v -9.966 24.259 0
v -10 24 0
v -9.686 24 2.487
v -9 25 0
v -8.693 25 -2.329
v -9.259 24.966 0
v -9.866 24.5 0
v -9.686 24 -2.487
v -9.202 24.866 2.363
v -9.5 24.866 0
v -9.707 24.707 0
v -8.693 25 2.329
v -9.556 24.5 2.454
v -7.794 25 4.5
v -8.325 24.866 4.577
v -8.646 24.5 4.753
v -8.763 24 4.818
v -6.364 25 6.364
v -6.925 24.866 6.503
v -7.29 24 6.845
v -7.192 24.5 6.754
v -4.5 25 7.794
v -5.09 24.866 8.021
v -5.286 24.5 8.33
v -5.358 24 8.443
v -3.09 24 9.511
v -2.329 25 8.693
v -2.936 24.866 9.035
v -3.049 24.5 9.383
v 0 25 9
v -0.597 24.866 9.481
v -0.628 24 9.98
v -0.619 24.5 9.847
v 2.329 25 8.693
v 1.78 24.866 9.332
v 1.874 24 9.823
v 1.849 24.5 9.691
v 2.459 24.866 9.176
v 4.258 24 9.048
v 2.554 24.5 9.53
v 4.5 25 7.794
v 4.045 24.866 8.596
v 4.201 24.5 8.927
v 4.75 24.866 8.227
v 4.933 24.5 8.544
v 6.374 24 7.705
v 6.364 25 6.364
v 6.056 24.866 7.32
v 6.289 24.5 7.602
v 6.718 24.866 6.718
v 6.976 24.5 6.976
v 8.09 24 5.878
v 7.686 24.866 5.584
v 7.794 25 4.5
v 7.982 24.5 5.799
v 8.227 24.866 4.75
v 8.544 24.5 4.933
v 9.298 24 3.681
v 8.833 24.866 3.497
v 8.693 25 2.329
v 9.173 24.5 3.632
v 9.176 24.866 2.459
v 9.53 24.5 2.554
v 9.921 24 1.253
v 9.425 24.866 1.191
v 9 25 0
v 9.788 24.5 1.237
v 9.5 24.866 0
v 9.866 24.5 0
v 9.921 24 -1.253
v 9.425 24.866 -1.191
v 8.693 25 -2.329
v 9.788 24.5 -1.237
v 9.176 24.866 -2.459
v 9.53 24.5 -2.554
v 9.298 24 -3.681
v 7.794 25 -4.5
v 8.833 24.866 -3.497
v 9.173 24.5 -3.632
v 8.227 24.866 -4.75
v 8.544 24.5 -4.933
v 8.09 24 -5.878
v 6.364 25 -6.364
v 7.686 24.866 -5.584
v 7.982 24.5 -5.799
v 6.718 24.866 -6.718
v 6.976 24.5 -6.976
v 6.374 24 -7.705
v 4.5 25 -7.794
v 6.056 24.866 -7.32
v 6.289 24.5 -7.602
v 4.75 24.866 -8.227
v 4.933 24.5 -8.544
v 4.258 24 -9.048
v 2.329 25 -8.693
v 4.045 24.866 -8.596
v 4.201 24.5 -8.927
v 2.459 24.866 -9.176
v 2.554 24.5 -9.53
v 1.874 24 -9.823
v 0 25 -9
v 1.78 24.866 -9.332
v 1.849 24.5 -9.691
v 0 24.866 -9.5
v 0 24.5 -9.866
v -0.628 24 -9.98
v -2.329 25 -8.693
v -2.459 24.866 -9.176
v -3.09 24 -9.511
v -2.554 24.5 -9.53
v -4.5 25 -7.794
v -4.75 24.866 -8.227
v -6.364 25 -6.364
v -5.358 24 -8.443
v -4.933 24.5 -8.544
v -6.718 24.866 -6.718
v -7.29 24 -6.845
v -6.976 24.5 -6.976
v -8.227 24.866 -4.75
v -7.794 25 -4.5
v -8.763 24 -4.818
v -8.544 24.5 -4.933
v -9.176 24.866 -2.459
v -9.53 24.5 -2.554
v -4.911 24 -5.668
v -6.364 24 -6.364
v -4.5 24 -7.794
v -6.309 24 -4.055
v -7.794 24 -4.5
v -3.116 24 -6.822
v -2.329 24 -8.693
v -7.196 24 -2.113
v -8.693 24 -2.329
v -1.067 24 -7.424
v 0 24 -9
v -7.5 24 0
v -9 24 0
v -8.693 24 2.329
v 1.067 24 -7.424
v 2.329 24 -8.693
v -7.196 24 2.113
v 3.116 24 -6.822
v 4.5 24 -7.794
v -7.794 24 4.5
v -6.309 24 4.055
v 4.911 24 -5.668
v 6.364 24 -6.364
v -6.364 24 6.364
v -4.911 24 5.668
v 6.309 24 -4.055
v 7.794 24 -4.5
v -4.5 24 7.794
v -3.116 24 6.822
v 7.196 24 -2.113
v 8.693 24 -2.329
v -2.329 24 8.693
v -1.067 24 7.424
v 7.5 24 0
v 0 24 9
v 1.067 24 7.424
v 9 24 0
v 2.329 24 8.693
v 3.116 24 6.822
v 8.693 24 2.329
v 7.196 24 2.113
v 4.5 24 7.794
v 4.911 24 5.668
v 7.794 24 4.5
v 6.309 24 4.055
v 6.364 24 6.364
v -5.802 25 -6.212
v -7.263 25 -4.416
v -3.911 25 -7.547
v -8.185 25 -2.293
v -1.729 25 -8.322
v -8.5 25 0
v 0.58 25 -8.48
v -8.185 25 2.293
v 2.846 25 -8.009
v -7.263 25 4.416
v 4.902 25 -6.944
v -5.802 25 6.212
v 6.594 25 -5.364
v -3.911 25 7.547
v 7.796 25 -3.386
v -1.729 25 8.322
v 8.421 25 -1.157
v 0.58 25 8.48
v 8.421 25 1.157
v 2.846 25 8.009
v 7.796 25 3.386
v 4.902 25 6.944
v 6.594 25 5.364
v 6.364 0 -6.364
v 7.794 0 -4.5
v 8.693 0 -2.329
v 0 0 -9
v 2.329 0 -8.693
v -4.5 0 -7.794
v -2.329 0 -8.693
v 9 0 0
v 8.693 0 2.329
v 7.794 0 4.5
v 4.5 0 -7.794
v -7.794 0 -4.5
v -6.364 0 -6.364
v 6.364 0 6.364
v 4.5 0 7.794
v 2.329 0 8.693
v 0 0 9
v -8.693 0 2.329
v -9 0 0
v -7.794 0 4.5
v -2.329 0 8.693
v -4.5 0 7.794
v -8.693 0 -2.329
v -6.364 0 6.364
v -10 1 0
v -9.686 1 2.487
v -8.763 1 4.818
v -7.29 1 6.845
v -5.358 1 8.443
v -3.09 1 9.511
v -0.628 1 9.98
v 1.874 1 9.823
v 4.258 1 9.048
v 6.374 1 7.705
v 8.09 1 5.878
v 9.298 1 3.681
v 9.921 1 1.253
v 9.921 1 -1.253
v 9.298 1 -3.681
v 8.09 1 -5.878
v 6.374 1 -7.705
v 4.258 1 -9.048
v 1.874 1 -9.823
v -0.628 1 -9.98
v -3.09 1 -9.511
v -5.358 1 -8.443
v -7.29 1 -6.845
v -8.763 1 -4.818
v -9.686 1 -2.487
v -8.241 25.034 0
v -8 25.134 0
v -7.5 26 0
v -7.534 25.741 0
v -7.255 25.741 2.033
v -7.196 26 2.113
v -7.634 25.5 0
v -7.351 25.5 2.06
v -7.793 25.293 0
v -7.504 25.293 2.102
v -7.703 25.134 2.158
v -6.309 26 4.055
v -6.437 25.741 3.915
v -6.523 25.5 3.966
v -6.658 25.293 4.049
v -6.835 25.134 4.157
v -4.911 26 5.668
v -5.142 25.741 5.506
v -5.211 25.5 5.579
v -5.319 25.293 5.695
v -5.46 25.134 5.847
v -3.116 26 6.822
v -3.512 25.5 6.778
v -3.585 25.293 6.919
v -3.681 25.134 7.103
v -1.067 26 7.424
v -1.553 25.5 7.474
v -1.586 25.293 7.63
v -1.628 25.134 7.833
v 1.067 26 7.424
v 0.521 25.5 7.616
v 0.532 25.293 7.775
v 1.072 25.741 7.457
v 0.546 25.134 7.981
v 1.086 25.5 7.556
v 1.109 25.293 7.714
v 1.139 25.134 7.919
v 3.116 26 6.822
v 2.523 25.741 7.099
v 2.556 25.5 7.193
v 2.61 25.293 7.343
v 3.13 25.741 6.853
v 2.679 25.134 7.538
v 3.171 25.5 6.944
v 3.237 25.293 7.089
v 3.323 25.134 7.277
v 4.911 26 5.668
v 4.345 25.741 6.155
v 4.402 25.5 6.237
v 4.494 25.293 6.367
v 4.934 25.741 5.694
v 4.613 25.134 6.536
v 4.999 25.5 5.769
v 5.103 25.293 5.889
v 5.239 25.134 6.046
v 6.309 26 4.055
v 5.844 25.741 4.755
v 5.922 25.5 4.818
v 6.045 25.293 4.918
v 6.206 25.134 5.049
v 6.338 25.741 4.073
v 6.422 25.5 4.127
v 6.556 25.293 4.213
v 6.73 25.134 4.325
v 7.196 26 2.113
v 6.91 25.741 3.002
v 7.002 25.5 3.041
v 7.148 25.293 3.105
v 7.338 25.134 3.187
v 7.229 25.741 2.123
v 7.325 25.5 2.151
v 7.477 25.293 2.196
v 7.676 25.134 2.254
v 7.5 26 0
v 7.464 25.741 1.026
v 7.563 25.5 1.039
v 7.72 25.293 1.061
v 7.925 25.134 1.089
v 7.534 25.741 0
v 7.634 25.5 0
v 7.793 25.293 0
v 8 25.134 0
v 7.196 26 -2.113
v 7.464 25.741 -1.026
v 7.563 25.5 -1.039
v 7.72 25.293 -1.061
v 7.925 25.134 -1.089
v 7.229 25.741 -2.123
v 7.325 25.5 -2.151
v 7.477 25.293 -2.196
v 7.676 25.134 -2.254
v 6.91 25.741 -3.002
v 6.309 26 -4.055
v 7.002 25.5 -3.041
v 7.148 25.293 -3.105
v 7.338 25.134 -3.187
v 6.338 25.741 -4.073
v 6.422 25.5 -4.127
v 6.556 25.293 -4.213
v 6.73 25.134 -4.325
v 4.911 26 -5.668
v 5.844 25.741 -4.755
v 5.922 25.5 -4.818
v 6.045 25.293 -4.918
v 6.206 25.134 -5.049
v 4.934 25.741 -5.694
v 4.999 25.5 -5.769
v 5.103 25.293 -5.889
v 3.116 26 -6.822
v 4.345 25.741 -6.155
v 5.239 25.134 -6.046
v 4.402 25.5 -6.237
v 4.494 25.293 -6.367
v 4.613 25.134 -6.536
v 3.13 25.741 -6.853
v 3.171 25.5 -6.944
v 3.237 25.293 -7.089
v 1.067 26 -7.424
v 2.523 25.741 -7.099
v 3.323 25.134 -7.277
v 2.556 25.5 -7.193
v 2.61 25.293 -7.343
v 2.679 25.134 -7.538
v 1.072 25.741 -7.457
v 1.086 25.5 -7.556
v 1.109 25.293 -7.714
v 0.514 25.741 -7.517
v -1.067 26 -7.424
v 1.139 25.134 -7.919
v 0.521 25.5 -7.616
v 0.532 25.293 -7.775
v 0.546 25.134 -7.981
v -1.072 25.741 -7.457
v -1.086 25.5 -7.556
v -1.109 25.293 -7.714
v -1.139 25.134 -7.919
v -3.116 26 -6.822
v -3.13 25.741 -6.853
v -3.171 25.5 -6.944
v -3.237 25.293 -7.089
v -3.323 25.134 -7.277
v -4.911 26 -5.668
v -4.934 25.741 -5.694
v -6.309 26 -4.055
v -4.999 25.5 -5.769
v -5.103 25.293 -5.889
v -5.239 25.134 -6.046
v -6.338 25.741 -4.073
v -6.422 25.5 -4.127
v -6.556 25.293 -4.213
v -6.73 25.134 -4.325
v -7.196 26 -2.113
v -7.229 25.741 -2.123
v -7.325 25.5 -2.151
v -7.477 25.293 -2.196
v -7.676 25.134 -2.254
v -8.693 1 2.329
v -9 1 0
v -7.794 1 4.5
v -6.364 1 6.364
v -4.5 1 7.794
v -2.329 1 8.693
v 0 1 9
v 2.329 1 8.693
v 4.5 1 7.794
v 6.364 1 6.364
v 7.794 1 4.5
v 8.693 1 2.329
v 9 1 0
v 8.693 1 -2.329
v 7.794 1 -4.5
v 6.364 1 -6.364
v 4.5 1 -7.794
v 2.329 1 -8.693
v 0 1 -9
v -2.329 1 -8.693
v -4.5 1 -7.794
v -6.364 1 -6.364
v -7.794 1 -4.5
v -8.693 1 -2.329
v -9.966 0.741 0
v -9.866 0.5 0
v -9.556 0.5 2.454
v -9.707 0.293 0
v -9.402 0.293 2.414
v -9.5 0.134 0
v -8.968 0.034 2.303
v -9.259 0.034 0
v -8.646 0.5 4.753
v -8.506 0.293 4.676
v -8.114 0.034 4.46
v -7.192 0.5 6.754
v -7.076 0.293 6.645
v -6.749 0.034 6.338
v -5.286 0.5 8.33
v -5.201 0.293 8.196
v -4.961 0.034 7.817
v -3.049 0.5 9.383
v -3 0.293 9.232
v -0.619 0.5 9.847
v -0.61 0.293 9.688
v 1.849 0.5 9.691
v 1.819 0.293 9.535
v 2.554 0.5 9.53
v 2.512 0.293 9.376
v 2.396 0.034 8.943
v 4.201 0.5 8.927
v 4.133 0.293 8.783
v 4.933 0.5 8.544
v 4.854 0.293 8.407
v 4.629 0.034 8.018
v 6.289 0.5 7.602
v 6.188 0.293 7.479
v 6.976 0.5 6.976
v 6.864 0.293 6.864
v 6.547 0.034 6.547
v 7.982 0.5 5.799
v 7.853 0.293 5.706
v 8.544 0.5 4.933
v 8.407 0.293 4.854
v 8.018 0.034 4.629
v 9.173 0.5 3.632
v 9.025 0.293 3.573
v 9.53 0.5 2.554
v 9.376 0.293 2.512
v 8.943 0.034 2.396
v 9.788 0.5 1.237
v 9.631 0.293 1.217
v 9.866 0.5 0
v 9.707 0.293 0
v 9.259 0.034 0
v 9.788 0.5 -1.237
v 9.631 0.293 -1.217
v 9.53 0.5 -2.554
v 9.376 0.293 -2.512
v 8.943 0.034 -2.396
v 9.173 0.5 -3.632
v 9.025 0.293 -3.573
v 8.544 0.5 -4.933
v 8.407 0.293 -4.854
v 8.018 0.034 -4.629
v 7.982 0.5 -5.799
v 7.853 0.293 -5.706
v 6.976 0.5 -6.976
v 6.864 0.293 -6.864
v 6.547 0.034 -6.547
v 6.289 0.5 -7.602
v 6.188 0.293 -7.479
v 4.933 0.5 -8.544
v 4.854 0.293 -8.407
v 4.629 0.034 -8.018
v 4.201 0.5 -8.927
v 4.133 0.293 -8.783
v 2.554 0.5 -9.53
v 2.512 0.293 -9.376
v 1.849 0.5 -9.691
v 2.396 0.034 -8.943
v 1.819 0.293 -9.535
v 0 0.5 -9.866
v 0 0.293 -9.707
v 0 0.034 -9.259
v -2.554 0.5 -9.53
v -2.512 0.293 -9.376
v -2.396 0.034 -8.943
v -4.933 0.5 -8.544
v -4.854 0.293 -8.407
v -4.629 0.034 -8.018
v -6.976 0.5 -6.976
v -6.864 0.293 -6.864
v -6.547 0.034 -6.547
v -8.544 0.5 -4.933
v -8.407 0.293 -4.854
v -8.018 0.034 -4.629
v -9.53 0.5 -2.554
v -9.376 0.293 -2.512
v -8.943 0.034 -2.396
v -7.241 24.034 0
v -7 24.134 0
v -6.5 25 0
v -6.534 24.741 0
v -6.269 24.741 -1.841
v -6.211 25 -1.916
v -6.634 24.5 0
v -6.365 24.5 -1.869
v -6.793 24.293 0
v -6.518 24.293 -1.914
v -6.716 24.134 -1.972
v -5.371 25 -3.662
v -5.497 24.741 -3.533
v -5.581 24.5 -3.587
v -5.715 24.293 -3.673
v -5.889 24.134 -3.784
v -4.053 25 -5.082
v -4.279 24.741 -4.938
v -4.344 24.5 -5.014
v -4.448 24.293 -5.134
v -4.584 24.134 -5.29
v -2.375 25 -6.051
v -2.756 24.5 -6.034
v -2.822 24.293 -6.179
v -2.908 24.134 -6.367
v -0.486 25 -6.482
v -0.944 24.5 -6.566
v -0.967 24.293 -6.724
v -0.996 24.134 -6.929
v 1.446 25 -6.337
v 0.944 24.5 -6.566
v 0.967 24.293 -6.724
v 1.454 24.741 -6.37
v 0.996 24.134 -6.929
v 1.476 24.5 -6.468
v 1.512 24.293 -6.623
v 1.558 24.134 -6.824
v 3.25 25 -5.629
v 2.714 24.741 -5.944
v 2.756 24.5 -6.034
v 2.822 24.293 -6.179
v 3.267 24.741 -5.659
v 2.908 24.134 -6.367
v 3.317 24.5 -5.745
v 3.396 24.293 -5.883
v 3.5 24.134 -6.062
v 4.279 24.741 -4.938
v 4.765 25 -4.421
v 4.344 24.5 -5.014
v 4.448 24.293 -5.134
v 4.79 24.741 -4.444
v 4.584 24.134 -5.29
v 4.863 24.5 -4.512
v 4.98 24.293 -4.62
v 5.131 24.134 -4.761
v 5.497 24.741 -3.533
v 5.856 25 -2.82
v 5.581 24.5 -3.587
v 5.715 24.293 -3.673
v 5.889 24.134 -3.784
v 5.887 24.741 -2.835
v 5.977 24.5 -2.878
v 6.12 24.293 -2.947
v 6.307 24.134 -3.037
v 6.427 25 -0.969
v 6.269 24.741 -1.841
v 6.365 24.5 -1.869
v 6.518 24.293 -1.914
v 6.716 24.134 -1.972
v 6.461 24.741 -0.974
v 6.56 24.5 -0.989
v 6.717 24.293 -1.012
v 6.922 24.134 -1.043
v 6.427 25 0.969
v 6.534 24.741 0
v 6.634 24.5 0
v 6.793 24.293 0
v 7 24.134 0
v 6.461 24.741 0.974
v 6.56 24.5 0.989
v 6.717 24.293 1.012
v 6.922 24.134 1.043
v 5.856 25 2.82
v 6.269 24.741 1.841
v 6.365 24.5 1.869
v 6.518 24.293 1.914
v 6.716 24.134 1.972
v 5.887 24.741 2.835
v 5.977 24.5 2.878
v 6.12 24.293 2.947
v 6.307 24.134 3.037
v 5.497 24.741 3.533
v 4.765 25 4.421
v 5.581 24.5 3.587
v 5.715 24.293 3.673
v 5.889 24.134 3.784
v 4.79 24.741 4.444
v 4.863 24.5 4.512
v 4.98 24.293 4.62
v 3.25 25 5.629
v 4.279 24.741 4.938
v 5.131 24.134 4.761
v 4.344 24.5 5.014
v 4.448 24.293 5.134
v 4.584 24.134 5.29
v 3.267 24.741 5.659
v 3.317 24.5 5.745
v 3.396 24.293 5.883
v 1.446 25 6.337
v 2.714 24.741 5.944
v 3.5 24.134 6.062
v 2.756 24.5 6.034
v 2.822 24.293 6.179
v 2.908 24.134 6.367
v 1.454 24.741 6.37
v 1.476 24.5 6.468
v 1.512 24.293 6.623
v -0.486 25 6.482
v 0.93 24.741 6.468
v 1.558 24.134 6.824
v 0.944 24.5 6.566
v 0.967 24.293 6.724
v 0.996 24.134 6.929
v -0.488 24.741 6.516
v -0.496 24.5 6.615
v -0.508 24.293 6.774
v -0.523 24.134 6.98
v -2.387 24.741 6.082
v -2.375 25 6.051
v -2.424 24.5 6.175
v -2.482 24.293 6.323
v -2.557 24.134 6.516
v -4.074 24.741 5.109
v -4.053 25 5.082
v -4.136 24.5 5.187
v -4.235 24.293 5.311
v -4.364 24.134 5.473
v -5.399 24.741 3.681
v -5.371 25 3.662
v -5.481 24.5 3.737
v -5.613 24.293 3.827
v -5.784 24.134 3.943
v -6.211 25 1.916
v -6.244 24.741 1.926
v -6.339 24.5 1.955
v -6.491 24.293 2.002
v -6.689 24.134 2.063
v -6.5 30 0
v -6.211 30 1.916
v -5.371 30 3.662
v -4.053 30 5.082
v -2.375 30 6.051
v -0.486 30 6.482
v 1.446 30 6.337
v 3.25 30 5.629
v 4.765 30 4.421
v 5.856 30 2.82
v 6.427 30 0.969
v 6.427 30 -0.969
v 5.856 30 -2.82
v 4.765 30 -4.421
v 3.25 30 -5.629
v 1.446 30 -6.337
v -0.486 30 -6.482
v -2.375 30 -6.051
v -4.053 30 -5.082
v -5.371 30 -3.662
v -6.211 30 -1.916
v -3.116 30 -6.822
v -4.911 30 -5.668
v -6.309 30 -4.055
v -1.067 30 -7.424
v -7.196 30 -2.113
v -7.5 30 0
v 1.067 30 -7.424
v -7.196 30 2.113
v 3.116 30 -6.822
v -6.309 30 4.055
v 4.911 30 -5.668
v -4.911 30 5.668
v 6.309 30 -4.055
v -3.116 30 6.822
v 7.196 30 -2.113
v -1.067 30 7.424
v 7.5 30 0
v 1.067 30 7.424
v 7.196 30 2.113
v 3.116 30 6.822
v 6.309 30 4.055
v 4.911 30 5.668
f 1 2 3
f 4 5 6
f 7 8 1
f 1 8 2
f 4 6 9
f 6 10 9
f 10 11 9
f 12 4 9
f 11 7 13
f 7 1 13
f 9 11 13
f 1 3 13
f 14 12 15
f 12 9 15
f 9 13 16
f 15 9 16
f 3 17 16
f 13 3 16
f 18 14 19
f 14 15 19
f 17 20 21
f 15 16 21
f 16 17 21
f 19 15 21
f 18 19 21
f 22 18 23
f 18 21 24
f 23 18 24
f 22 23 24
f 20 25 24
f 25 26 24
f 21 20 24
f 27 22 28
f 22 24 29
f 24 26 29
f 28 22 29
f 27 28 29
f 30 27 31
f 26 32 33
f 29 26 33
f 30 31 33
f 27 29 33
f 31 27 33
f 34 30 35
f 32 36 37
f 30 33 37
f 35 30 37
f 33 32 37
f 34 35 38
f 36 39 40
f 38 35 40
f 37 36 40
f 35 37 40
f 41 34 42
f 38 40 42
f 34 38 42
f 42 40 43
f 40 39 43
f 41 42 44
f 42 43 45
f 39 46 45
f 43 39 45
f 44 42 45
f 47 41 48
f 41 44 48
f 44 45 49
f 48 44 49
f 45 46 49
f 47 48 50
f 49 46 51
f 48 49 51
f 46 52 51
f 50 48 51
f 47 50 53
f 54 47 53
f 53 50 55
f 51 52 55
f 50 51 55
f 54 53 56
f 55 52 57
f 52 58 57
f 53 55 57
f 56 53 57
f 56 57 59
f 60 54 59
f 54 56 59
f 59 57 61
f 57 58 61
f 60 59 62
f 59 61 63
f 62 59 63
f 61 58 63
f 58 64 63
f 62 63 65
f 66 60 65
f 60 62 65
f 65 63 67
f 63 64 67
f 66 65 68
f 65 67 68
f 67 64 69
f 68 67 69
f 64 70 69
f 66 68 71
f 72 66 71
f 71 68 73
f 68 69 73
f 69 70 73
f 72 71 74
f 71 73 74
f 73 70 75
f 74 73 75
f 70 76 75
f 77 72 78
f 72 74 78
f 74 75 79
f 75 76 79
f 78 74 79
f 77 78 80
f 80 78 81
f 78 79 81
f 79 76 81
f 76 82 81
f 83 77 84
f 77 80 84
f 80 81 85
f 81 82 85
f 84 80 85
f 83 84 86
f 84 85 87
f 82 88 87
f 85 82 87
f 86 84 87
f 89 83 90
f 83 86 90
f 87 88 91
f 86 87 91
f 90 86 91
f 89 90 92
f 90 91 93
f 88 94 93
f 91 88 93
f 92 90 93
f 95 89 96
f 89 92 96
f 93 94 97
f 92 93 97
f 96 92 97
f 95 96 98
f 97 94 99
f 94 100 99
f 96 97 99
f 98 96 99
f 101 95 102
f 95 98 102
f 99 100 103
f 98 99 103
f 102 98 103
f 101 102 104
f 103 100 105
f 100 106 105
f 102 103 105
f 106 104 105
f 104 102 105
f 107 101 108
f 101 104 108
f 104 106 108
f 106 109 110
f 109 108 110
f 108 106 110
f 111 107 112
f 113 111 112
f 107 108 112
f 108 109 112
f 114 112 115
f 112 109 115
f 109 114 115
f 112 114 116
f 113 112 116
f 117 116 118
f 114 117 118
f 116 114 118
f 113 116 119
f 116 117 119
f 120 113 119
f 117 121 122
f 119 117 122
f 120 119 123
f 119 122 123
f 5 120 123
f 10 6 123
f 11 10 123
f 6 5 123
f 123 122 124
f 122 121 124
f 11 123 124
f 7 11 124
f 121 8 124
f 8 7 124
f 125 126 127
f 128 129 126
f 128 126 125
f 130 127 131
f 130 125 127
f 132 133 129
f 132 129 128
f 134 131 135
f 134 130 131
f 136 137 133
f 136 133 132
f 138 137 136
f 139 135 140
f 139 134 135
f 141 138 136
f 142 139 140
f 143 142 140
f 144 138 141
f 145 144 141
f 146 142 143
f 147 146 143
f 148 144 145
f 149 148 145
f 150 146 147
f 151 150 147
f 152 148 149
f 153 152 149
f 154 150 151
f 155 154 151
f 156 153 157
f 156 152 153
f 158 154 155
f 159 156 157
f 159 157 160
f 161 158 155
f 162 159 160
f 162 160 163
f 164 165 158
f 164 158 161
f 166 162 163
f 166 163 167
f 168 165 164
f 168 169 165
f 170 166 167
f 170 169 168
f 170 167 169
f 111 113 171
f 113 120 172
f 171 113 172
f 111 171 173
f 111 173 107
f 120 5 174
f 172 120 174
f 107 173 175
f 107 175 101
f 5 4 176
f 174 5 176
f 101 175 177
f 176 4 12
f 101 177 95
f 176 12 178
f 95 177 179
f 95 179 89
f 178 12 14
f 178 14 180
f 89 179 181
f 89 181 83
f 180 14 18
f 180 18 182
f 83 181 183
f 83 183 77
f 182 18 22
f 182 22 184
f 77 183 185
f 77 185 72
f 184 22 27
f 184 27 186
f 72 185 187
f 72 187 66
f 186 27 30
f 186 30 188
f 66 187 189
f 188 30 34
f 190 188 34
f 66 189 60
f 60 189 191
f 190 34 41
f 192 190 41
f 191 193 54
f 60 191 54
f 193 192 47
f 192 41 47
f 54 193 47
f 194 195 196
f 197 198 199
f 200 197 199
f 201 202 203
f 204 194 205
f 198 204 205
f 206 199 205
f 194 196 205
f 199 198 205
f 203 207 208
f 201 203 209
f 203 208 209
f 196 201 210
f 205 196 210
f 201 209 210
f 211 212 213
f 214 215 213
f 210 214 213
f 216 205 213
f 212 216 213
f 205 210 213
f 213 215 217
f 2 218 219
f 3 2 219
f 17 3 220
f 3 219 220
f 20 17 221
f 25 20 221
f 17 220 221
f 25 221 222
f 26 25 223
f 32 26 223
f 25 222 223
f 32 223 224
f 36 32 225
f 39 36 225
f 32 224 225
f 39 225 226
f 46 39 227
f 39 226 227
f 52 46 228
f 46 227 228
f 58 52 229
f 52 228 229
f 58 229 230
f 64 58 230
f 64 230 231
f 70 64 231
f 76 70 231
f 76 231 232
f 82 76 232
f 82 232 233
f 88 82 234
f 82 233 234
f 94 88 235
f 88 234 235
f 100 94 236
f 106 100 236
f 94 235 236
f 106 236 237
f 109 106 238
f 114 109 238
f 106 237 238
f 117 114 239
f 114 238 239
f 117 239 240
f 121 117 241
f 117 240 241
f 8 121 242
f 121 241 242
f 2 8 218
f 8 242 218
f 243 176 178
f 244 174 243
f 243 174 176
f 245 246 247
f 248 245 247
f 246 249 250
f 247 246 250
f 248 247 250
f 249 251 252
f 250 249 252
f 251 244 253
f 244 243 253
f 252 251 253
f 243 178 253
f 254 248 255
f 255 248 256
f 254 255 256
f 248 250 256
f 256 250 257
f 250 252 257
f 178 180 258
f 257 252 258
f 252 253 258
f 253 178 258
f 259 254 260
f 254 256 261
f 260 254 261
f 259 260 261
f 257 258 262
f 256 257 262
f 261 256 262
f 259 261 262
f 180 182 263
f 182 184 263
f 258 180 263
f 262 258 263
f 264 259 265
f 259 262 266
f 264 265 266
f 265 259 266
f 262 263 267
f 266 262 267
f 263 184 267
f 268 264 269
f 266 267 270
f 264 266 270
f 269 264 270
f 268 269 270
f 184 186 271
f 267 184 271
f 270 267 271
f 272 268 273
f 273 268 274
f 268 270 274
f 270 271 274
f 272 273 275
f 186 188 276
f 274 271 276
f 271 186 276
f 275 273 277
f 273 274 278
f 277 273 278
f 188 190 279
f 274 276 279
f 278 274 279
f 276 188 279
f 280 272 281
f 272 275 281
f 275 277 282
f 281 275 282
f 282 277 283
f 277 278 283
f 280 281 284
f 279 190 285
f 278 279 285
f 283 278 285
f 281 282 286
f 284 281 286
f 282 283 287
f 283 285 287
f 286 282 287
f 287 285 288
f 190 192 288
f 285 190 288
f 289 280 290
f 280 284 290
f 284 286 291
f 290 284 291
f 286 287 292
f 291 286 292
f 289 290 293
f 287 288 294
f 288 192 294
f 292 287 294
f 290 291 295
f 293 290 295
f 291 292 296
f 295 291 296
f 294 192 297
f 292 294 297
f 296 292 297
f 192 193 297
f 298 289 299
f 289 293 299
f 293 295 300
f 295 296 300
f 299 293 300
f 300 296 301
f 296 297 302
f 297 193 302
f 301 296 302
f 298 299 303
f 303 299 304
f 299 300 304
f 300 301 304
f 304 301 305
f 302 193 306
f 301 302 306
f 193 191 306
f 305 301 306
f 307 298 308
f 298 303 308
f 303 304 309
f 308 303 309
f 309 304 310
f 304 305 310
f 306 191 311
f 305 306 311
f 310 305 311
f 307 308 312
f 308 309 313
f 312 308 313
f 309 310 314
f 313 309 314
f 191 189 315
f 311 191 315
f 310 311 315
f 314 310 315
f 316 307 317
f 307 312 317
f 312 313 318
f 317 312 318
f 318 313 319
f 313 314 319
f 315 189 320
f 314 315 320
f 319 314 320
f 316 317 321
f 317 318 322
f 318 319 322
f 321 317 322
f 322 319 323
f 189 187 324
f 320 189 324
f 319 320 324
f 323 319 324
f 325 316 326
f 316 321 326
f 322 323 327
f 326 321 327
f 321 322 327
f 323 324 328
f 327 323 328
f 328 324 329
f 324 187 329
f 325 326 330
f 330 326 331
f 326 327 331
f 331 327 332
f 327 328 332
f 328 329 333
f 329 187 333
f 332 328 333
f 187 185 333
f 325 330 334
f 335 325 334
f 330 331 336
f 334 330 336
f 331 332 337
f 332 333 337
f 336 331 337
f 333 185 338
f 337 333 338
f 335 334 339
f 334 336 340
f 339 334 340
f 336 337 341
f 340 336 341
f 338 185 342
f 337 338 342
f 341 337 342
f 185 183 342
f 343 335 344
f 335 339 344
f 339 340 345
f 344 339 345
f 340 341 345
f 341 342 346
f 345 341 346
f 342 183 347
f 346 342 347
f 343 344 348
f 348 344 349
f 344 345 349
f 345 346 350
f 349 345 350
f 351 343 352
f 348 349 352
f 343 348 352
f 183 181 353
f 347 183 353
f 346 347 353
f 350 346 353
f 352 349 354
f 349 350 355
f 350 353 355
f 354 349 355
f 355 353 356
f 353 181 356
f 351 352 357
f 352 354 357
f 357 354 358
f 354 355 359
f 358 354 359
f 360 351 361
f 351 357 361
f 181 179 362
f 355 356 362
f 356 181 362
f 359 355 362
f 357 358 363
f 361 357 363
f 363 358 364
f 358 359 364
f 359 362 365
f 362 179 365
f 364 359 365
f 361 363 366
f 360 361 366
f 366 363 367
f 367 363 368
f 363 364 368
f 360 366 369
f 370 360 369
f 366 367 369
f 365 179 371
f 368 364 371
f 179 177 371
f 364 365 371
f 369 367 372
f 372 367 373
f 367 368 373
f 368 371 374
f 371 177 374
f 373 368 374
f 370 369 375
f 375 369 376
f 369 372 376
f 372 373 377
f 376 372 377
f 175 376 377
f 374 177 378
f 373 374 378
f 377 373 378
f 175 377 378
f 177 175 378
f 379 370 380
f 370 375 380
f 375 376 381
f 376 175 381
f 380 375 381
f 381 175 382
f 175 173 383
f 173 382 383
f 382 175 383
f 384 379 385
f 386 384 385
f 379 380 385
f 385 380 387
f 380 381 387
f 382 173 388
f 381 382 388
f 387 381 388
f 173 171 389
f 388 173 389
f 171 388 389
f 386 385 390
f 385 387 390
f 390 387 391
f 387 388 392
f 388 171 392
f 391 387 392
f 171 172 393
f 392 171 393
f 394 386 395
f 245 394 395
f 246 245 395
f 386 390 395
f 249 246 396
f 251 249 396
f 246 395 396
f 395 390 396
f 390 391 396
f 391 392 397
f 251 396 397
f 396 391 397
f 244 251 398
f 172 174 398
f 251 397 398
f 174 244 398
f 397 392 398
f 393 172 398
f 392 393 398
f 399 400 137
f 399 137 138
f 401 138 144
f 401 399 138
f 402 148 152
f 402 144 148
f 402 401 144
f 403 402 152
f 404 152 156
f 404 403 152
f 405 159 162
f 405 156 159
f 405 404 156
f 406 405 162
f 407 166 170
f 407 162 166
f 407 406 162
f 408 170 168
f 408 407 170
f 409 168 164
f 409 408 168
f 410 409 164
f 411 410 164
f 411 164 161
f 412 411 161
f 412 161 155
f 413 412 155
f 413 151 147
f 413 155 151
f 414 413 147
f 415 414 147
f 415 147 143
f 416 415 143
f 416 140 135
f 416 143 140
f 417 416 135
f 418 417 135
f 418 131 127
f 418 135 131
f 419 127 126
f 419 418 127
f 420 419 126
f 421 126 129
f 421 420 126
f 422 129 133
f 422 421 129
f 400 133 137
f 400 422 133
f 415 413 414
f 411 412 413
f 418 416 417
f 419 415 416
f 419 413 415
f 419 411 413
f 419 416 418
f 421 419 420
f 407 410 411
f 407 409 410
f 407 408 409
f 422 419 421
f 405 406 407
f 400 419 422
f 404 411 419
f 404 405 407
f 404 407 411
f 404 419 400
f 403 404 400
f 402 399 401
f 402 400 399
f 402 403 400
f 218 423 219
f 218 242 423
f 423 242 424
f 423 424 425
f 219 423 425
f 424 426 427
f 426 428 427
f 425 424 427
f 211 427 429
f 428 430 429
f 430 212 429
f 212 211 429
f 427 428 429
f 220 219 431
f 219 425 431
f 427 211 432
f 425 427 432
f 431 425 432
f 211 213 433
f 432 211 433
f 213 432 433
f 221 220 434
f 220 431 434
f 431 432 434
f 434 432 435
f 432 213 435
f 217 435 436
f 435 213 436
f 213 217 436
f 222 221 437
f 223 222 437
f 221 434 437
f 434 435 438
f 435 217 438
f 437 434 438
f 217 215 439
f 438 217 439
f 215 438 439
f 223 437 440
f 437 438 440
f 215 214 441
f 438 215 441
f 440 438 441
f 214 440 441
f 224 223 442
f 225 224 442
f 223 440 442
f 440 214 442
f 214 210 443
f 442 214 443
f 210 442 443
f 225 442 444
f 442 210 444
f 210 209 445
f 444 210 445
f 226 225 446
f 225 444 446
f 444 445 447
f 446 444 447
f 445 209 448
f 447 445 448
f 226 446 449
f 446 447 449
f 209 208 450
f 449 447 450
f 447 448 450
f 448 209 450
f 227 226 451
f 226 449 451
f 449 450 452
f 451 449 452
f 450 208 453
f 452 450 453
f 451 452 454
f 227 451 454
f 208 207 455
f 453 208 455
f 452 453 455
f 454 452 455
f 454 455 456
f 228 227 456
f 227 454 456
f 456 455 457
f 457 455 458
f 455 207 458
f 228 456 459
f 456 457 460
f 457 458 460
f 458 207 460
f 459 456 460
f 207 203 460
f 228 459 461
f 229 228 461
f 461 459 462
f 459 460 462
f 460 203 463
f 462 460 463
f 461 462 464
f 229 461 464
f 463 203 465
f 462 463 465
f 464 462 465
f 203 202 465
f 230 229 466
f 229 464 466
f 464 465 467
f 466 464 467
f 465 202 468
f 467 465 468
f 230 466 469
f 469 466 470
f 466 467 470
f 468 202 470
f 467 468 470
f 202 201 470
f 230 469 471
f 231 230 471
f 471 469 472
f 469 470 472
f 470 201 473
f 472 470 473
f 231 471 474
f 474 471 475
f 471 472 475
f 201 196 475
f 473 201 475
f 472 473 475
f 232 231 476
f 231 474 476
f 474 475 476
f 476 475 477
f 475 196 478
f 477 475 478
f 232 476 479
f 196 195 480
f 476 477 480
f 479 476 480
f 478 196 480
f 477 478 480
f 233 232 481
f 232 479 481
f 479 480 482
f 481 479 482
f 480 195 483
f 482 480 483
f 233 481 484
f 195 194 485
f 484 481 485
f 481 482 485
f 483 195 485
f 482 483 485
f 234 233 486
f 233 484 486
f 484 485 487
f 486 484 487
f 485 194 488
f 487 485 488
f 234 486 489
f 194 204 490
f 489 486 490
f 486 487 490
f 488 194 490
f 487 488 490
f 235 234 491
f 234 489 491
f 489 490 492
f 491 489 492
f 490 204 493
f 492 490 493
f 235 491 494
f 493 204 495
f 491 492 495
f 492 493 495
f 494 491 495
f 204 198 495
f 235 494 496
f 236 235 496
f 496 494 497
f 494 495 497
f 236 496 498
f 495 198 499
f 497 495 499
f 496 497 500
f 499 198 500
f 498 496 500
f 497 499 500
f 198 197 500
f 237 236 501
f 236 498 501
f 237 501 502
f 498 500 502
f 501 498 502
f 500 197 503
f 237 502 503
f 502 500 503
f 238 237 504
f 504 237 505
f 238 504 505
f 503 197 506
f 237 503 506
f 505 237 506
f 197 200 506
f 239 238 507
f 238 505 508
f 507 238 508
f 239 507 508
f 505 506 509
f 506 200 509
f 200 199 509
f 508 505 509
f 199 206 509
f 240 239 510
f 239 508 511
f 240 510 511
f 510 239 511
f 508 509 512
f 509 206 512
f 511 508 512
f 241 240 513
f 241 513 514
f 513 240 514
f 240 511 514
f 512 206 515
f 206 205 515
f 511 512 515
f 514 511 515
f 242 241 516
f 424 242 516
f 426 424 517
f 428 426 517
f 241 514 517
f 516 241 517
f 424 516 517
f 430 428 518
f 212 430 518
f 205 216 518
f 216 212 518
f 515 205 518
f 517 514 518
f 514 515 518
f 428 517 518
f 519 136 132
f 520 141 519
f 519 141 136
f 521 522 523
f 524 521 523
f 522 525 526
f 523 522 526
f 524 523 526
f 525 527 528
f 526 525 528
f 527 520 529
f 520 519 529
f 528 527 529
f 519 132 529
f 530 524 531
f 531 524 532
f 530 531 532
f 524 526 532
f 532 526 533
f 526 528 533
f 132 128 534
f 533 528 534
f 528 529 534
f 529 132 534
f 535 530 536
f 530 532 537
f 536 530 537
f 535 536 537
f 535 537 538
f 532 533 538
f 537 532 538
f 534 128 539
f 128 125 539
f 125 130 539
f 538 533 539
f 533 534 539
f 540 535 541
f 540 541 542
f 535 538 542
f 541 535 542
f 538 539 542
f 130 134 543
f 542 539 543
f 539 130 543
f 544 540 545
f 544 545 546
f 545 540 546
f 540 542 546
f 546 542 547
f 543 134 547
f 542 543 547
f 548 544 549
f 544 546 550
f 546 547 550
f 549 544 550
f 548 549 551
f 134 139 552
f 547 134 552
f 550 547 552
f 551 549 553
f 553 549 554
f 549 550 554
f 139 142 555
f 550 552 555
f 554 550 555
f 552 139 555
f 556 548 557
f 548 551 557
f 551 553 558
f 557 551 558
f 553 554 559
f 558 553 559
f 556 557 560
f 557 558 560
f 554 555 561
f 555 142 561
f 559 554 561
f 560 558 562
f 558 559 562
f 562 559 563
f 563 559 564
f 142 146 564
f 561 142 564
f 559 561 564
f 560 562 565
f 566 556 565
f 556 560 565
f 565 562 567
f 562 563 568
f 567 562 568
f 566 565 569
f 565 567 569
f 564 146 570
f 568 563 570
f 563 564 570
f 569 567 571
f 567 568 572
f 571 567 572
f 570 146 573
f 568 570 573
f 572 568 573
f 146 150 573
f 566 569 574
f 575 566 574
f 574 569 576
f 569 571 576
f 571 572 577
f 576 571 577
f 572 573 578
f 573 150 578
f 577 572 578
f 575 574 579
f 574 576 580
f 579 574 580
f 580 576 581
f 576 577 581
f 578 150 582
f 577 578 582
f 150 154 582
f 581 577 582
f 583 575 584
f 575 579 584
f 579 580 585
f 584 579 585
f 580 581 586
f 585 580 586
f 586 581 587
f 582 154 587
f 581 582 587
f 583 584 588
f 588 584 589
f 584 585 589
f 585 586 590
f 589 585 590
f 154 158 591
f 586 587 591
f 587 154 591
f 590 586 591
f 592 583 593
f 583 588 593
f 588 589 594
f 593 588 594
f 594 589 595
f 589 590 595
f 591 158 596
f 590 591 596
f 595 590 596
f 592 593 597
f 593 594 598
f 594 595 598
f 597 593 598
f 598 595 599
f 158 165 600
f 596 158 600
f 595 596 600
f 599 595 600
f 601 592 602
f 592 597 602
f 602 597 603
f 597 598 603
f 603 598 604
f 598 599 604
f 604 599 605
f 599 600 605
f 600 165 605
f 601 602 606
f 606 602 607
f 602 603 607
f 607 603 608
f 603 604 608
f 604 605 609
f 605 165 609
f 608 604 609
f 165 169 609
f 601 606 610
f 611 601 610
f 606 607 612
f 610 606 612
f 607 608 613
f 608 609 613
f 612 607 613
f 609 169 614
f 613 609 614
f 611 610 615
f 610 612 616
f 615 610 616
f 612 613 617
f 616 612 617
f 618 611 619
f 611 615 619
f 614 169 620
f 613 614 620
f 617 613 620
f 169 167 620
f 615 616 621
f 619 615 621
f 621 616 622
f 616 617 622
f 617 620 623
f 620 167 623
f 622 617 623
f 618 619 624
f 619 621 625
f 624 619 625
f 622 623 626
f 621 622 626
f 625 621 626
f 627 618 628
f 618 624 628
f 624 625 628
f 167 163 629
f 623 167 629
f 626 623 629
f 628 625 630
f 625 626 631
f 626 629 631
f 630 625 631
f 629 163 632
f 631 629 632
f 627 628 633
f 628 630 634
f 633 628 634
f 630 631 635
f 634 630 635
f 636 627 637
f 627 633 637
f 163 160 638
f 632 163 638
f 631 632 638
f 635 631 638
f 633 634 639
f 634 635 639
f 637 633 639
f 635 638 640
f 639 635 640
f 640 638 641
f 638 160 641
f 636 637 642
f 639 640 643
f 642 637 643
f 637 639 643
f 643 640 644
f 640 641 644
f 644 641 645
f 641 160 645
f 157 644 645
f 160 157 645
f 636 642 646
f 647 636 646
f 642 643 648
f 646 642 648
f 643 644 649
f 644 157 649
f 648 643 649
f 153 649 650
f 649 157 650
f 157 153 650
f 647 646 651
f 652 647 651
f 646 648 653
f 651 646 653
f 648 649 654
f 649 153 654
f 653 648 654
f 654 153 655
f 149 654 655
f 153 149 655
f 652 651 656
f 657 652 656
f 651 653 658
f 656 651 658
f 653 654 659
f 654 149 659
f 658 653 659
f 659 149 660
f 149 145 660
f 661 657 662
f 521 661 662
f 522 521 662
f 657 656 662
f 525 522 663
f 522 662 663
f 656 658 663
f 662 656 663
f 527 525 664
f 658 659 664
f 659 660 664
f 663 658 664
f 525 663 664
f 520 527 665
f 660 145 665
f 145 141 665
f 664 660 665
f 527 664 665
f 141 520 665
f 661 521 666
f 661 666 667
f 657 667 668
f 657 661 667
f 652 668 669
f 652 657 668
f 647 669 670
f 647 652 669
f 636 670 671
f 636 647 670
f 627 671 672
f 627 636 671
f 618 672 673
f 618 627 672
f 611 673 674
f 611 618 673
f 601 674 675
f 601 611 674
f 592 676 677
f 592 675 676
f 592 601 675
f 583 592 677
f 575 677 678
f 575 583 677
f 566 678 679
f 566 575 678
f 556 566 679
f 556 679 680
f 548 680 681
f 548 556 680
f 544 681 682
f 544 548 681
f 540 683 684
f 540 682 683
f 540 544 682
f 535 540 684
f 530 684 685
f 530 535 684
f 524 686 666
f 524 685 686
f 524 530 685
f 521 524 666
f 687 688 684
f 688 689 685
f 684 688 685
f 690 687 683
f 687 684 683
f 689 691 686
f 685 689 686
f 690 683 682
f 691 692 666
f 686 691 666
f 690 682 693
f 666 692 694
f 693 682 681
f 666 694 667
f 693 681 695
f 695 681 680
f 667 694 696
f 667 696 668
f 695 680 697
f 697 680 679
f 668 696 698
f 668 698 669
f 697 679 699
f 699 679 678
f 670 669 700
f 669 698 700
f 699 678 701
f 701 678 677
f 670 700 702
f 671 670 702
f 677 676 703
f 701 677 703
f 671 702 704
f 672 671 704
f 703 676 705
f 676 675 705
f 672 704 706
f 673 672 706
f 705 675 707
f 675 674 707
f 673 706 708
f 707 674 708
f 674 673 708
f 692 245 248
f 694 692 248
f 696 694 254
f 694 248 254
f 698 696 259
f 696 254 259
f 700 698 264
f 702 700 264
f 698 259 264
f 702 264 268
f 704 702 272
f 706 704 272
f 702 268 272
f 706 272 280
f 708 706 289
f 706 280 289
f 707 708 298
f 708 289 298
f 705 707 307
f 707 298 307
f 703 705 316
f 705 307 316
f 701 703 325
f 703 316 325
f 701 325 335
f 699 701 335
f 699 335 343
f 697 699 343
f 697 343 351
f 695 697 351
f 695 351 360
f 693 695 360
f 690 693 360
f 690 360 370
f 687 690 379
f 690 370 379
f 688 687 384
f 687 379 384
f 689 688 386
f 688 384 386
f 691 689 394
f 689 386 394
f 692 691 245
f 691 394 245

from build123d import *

# Parameters (mm, degrees)
SHELL1_T  = -1
FILLET1_R = 1
FILLET2_R = 1


with BuildPart() as part:
    # Sketch1 → Revolve1 (revolve)
    with BuildSketch(Plane.XY):
        Polygon((0, 0), (0, 30), (-7.5, 30), (-7.5, 25), (-10, 25), (-10, 0), align=None)
    revolve(axis=Axis((0, 30, 0), (0, 1, 0)))

    # Shell1
    shell1_openings = [part.faces().sort_by_distance(p)[0] for p in [
        (0, 30, -7.5),
    ]]
    offset(amount=SHELL1_T, openings=shell1_openings, kind=Kind.INTERSECTION)

    # Fillet1
    fillet1_edges = [part.edges().sort_by_distance(p)[0] for p in [
        (7.5, 25, 0),
        (10, 25, 0),
        (10, 0, 0),
    ]]
    fillet(fillet1_edges, radius=FILLET1_R)

    # Fillet2
    fillet2_edges = [part.edges().sort_by_distance(p)[0] for p in [
        (6.5, 24, 0),
    ]]
    fillet(fillet2_edges, radius=FILLET2_R)


solid = part.part
